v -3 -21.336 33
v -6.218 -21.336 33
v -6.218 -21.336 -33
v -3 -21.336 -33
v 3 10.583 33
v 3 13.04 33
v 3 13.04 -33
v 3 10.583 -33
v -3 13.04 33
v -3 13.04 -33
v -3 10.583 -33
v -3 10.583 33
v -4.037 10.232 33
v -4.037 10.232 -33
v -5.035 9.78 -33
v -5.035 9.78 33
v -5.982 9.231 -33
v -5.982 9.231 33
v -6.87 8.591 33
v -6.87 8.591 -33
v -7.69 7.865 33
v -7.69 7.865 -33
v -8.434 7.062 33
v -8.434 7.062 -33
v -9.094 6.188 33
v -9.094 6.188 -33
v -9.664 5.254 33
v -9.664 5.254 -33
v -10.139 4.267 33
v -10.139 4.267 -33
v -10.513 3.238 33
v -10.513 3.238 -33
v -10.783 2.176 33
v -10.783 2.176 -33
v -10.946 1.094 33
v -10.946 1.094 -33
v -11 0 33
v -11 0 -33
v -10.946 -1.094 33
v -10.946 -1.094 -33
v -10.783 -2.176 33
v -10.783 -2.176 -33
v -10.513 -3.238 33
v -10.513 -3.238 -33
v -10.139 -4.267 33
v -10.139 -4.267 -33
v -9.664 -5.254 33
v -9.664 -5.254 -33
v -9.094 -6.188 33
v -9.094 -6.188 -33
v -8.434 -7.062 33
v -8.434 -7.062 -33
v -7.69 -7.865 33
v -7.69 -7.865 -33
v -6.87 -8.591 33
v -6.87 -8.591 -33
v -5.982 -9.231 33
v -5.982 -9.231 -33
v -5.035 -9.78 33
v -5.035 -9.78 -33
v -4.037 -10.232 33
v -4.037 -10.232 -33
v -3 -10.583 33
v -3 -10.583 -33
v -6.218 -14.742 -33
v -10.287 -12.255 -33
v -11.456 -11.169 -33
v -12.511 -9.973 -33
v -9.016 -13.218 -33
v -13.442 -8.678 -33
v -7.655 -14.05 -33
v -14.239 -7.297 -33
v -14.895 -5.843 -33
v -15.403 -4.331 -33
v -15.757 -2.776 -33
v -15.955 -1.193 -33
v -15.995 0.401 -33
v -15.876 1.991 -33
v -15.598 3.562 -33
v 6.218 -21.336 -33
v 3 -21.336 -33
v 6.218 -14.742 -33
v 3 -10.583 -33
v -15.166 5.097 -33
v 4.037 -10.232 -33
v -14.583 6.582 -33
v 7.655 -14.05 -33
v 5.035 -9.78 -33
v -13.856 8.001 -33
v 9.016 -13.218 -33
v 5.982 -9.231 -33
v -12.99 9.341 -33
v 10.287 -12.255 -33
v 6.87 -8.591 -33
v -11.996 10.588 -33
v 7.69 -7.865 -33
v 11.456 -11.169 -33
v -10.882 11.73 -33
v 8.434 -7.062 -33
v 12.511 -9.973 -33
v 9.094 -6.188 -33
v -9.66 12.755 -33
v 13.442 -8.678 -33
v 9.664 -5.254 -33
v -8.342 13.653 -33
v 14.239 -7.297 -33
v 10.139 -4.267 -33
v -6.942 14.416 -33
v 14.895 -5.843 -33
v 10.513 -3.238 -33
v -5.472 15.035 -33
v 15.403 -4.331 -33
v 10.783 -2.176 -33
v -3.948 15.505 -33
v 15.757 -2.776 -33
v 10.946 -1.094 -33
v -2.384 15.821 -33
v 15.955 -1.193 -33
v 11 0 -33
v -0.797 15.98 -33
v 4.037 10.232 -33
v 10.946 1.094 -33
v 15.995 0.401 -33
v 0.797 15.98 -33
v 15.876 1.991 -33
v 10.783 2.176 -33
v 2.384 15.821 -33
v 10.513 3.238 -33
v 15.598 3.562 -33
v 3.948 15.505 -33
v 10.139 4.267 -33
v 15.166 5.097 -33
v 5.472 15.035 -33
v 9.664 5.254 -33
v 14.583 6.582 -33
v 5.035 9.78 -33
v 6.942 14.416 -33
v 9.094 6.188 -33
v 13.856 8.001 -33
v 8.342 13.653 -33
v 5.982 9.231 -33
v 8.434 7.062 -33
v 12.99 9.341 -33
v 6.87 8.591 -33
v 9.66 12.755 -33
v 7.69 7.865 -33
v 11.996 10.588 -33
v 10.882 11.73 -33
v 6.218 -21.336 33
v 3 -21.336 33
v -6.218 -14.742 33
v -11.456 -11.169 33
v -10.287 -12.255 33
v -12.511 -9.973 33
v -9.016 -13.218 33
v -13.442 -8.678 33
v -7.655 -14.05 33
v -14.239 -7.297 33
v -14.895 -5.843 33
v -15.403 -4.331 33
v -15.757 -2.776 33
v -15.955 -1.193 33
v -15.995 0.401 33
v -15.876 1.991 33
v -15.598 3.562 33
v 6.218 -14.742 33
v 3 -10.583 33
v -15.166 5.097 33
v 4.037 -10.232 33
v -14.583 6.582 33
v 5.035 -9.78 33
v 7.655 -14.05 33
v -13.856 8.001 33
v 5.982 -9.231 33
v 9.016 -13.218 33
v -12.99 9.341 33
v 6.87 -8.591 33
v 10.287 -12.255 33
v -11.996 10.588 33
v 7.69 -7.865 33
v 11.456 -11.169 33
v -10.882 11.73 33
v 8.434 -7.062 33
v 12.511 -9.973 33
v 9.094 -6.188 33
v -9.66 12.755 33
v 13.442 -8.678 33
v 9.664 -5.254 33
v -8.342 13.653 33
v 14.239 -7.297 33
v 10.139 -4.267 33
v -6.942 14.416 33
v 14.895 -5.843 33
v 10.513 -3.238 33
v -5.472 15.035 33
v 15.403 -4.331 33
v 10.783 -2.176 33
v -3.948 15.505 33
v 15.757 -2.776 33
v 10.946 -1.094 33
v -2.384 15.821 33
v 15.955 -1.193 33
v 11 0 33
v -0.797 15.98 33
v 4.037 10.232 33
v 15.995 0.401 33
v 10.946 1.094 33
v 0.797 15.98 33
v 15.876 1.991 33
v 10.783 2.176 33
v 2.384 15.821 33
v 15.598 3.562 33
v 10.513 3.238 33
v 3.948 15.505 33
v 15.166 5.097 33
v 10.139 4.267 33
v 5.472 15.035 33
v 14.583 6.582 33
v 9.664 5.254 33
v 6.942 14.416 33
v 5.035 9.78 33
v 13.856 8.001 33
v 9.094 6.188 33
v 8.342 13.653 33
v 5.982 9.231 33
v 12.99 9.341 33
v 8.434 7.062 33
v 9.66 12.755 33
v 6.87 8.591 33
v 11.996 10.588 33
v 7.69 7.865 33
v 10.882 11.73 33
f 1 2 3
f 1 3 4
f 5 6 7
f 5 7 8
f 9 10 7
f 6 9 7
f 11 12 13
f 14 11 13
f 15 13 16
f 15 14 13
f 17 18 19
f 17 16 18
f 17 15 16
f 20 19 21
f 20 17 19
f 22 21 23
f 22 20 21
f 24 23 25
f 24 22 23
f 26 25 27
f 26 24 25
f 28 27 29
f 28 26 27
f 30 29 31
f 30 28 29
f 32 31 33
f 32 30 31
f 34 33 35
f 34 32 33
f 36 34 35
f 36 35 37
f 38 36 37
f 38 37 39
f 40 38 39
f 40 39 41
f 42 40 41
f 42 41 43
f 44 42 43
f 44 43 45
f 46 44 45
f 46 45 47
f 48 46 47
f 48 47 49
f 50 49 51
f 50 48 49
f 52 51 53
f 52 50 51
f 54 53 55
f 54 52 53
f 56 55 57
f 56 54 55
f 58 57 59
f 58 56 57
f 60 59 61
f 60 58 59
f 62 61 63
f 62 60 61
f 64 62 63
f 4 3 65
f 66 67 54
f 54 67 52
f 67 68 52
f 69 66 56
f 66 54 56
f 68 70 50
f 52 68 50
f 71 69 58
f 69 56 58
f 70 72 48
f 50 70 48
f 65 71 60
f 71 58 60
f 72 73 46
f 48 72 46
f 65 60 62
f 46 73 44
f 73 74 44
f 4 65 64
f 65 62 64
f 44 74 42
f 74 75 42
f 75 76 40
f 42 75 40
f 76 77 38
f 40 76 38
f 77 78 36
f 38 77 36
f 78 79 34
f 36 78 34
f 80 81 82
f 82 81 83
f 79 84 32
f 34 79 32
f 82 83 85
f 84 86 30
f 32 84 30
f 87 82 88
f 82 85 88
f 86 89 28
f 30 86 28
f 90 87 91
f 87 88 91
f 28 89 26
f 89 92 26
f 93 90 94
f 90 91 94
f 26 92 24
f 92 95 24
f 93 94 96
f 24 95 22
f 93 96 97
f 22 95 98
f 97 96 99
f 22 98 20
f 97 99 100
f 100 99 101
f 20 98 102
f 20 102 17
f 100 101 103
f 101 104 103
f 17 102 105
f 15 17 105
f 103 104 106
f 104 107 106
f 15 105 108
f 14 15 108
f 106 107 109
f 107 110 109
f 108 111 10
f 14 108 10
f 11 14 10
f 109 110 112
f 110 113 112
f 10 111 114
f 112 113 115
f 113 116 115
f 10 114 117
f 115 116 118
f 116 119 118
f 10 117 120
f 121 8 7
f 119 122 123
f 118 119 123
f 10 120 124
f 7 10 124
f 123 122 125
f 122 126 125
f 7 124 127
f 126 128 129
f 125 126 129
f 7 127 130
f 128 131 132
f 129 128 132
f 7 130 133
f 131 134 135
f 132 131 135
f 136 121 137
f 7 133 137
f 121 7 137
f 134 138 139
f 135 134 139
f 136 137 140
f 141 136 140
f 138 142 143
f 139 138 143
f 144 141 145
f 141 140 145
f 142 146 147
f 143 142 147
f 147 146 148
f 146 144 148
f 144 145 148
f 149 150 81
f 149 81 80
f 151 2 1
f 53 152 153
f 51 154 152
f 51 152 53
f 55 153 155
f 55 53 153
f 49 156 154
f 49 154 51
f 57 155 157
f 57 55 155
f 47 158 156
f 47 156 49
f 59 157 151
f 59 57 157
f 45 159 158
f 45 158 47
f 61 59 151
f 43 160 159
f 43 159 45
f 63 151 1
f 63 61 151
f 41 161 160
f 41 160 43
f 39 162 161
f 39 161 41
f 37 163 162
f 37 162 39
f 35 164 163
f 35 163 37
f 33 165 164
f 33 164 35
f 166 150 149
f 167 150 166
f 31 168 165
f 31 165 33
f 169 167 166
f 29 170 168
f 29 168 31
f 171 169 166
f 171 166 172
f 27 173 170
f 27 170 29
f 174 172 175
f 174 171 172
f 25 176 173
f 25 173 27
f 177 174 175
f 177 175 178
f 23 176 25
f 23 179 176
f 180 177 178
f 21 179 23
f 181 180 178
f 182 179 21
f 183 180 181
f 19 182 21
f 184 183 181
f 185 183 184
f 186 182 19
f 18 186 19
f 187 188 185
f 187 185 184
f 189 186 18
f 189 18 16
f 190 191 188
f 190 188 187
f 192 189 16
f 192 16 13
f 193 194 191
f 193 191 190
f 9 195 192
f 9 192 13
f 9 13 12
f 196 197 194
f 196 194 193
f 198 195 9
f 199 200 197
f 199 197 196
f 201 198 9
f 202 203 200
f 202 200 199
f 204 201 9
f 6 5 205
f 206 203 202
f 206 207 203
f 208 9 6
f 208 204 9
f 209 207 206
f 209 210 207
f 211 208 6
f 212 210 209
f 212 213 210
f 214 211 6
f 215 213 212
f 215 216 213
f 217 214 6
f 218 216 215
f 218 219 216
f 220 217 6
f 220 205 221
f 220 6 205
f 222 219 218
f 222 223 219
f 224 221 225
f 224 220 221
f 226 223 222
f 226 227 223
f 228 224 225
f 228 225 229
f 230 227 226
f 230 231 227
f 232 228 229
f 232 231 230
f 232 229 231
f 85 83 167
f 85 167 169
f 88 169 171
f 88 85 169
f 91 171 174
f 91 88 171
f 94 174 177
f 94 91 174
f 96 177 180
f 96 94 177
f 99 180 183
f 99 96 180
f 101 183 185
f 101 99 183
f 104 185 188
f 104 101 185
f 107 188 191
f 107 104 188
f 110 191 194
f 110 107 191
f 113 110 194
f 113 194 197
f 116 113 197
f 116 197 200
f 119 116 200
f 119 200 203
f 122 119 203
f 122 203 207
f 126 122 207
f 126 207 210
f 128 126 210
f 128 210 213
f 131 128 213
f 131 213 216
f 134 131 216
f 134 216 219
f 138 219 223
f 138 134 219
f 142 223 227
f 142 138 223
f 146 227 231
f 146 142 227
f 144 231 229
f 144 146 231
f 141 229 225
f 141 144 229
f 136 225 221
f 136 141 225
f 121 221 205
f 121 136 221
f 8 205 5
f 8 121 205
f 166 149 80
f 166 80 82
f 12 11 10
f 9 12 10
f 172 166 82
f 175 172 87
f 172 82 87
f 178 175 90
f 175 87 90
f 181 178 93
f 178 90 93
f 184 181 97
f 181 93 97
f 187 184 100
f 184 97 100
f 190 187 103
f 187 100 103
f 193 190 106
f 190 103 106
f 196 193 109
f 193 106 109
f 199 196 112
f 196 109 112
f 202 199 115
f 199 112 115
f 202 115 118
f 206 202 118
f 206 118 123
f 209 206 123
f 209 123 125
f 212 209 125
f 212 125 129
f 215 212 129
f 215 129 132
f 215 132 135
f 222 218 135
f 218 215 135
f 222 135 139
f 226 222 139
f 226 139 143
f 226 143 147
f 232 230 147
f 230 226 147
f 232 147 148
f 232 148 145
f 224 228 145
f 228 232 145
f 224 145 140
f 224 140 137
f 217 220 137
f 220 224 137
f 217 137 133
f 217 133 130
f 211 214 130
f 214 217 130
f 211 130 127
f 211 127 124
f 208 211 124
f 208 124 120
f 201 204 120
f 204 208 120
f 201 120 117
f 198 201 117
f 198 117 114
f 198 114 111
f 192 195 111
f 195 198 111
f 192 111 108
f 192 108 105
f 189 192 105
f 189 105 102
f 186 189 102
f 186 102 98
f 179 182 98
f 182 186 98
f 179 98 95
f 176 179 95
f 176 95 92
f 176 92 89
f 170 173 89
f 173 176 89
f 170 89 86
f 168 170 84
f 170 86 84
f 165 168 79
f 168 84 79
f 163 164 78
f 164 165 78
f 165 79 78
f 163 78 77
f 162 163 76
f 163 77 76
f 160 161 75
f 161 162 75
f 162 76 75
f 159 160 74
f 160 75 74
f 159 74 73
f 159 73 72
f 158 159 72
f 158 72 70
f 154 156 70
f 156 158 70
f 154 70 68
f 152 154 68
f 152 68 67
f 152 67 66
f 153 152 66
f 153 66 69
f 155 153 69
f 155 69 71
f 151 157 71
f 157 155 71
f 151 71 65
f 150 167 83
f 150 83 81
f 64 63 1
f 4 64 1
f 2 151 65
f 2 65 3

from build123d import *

# Parameters (mm, degrees)
BOSS_EXTRUDE1_DEPTH      = 33
BOSS_EXTRUDE1_DEPTH_BACK = 33
SKETCH1_R                = 16
SKETCH1_R_2              = 11
CUT_EXTRUDE1_DEPTH       = 33
BOSS_EXTRUDE2_DEPTH      = 66
CUT_EXTRUDE4_DEPTH       = 72.18434857


with BuildPart() as part:
    # Sketch1 → Boss-Extrude1 (new, two sides: drawn at the far end of the back side and taken through both)
    with BuildSketch(Plane.XY.offset(-BOSS_EXTRUDE1_DEPTH_BACK)):
        Circle(SKETCH1_R)
        Circle(SKETCH1_R_2, mode=Mode.SUBTRACT)
    extrude(amount=BOSS_EXTRUDE1_DEPTH + BOSS_EXTRUDE1_DEPTH_BACK)

    # Sketch2 → Cut-Extrude1 (cut)
    with BuildSketch(Plane.XY.offset(33)):
        with BuildLine():
            Line((-3, 10.540195713), (-3, 13.040195713))
            Line((-3, 13.040195713), (0, 13.040195713))
            Line((0, 13.040195713), (3, 13.040195713))
            Line((3, 13.040195713), (3, 10.540195713))
            ThreePointArc((3, 10.540195713), (0, 10.958819538), (-3, 10.540195713))
        make_face()
    cut_extrude1 = extrude(amount=-CUT_EXTRUDE1_DEPTH, mode=Mode.SUBTRACT)

    # Mirror2: Cut-Extrude1 across plane
    add(cut_extrude1.mirror(Plane(origin=(0, 0, 0), x_dir=(1, 0, 0), z_dir=(0, 0, -1))), mode=Mode.SUBTRACT)

    # Sketch3 → Boss-Extrude2 (add, through all)
    with BuildSketch(Plane.XY.offset(33)):
        with BuildLine():
            Line((-3, -21.335685631), (-3, -15.716233646))
            ThreePointArc((-3, -15.716233646), (-4.63488117, -15.31397651), (-6.218441038, -14.74215015))
            Line((-6.218441038, -14.74215015), (-6.218441038, -21.335685631))
            Line((-6.218441038, -21.335685631), (-3, -21.335685631))
        make_face()
        with BuildLine():
            ThreePointArc((6.218441038, -14.74215015), (4.63488117, -15.31397651), (3, -15.716233646))
            Line((3, -15.716233646), (3, -21.335685631))
            Line((3, -21.335685631), (6.218441038, -21.335685631))
            Line((6.218441038, -21.335685631), (6.218441038, -14.74215015))
        make_face()
    extrude(amount=-BOSS_EXTRUDE2_DEPTH)

    # Sketch4 → Cut-Extrude4 (cut, through all)
    with BuildSketch(Plane.XY.offset(33)):
        Polygon((-3, -10.583005244), (-3, -16.271539673), (3, -16.271539673), (3, -15.716233646), (3, -10.583005244), align=None)
    extrude(amount=-CUT_EXTRUDE4_DEPTH, mode=Mode.SUBTRACT)


solid = part.part
